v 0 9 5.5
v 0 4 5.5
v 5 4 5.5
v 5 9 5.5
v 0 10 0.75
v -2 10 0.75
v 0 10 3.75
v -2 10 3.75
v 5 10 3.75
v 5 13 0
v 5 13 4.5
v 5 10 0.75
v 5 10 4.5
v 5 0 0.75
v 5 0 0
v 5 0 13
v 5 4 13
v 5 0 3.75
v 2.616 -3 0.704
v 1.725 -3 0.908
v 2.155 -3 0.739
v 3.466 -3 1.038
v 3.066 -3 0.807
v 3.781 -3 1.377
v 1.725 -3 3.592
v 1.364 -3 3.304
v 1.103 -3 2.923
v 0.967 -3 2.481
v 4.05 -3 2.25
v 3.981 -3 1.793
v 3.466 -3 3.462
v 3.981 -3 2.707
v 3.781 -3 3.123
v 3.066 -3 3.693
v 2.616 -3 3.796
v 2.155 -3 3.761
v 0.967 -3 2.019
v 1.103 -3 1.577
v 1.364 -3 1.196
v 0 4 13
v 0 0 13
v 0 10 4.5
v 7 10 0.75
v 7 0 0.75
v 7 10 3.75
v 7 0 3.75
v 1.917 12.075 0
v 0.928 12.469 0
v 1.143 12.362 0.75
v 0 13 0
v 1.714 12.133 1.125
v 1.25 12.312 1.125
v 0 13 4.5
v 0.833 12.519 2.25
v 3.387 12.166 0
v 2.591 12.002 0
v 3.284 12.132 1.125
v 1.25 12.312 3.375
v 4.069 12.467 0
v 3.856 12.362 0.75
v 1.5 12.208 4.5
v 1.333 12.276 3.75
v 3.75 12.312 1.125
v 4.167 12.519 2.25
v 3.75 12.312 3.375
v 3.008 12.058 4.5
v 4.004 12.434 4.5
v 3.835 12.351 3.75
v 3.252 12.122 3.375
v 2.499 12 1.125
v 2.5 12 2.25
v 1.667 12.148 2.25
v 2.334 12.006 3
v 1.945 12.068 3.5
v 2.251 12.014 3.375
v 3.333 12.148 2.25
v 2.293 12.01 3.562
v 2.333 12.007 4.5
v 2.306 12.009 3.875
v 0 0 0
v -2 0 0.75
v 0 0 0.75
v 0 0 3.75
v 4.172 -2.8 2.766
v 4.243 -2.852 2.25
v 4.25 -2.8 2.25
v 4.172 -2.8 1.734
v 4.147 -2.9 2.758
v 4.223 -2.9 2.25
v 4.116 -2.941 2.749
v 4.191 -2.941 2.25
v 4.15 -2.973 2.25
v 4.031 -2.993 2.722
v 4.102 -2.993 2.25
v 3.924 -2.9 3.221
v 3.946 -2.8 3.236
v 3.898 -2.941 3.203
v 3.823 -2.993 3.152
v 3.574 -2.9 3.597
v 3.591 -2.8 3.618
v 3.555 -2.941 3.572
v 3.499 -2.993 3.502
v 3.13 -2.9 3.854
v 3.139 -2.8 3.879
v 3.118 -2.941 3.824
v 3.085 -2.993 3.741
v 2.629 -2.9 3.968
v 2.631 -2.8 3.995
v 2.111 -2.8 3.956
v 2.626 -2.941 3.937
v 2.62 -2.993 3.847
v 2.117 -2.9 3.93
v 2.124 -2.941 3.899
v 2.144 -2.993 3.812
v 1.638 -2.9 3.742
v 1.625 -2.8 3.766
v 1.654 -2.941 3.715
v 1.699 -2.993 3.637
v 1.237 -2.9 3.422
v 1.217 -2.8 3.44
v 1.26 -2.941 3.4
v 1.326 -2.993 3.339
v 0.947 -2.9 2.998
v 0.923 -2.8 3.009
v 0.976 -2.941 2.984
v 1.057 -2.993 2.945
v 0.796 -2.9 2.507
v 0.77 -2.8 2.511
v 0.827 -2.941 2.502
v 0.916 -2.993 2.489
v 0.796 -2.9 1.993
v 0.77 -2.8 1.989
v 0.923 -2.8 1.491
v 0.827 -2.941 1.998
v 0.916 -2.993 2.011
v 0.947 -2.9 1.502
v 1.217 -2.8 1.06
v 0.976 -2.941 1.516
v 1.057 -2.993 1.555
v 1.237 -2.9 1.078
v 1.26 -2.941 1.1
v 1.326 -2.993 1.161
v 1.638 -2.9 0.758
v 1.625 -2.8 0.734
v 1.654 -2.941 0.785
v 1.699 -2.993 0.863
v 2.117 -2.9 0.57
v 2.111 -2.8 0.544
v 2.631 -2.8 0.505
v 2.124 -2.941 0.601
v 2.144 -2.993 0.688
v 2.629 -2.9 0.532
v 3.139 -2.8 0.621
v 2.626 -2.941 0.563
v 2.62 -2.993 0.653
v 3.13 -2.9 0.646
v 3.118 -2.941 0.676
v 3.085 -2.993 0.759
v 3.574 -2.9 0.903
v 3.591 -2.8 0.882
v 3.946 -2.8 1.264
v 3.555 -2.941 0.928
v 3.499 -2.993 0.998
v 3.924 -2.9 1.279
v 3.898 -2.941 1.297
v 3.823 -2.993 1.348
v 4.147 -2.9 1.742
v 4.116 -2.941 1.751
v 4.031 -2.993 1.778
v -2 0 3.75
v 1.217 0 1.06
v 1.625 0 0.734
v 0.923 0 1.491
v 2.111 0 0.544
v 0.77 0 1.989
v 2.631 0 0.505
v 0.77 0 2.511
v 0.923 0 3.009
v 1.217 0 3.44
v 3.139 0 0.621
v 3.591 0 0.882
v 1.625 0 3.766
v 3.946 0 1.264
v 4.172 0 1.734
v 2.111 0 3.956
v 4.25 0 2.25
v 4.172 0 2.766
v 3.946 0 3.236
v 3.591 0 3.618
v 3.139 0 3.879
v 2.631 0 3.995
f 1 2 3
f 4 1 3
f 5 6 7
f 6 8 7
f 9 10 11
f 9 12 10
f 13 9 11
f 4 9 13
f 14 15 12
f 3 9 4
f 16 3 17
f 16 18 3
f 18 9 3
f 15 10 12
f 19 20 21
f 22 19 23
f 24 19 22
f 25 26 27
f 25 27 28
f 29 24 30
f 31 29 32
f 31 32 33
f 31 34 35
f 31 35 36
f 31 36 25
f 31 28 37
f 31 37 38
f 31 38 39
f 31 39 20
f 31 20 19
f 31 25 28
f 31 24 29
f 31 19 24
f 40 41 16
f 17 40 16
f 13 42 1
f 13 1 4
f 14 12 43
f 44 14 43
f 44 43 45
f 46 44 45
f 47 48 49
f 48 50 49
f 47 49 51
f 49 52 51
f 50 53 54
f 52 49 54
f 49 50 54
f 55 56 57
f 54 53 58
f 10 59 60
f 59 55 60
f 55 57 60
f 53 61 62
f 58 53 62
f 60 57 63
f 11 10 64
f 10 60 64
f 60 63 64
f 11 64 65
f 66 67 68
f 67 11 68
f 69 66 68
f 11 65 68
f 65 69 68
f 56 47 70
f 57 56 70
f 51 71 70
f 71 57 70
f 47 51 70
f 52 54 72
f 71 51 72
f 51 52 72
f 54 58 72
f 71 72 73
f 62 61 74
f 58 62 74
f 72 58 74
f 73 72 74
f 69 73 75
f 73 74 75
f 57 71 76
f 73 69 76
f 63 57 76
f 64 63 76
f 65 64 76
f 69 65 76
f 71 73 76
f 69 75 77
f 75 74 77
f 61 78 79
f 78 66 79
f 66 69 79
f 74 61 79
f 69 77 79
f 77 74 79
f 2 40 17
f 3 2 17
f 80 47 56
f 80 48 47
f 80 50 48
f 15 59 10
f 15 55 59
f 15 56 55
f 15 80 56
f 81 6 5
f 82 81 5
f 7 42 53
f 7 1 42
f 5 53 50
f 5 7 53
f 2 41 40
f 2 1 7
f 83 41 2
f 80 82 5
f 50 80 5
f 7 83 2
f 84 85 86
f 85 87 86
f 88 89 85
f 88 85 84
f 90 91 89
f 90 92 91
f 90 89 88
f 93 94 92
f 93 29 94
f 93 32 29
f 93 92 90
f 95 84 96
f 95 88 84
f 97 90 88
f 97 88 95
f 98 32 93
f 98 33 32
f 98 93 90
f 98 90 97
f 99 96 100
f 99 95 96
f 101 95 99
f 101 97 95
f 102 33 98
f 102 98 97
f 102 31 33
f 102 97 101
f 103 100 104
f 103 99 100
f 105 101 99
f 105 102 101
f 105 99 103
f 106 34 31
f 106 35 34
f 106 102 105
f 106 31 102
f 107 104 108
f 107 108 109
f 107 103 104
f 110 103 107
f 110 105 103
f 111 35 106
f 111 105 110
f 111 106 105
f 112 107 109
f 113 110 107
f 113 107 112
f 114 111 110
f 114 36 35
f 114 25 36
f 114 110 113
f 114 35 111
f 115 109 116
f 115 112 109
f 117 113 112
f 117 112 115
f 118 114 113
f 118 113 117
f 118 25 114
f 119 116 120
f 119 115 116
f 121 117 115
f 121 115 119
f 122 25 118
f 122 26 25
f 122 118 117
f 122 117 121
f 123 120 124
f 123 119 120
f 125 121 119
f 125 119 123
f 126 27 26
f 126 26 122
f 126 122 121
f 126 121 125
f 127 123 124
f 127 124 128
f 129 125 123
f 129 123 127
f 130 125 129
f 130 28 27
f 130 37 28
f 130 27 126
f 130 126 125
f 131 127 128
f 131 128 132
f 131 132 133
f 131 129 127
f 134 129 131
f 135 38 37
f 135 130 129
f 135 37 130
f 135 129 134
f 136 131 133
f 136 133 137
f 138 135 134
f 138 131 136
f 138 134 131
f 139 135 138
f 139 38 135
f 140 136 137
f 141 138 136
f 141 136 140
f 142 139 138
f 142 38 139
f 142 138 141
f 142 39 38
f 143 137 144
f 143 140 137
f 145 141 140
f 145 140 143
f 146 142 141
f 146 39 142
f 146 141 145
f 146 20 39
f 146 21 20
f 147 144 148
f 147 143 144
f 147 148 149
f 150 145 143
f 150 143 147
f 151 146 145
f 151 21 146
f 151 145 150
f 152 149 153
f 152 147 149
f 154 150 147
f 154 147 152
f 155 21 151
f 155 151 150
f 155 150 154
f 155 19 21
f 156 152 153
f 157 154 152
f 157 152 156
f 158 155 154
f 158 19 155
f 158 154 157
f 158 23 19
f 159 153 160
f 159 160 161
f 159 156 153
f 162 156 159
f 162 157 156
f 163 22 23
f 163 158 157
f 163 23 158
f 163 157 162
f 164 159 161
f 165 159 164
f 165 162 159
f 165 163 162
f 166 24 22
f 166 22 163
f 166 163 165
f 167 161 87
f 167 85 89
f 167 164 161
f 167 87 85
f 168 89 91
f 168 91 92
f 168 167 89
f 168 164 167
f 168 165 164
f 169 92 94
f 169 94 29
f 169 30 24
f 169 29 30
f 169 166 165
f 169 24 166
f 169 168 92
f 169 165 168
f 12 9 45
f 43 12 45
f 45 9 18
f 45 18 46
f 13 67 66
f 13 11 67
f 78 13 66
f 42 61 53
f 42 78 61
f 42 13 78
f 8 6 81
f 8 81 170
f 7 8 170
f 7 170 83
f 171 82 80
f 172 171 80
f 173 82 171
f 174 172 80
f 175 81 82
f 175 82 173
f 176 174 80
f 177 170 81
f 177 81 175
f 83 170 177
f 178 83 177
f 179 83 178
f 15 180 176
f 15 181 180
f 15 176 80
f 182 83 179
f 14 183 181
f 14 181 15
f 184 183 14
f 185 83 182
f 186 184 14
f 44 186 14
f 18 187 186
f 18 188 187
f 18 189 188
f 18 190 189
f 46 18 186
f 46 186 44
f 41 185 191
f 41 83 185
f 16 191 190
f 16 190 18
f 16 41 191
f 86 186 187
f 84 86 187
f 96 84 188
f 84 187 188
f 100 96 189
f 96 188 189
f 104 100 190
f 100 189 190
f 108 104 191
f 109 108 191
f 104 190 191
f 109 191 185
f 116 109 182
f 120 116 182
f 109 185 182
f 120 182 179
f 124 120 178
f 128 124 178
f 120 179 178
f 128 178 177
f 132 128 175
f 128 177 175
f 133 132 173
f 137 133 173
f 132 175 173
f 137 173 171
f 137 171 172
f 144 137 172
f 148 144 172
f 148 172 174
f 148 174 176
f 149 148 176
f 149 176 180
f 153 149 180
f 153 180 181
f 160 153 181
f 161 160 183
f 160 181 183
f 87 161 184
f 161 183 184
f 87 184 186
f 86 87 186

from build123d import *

# Parameters (mm, degrees)
F0_W     = 5
F0_H     = 7.5
F0_R     = 1.75
F0_H_2   = 1
F1_DEPTH = 4
F2_DEPTH = 3
F0_W_2   = 2
F0_H_3   = 3
F3_DEPTH = 10
F4_DEPTH = 13
F5_SIZE  = 0.99999
F7_DEPTH = 4.501
F8_R     = 0.2


# Not quite as in the source:
# - a fillet or chamfer is up to 0.001 mm smaller than in the source, because OpenCascade refuses the exact size


with BuildPart() as f1:
    # F0 (on Front) → F1 (new body)
    with BuildSketch(Plane.XZ):
        with Locations((2.5, 9.25)):
            Rectangle(F0_W, F0_H)
        Polygon((0, 0.75), (0, 0), (5, 0), (5, 0.75), (5, 3.75), (5, 4.5), (0, 4.5), (0, 3.75), align=None)
        with Locations((2.5, 2.25)):
            Circle(F0_R, mode=Mode.SUBTRACT)
        with Locations((2.5, 2.25)):
            Circle(F0_R)
        with Locations((2.5, 5)):
            Rectangle(F0_W, F0_H_2)
    extrude(amount=-F1_DEPTH)

    # F0 (on Front) → F2 (join)
    with BuildSketch(Plane.XZ):
        with Locations((2.5, 2.25)):
            Circle(F0_R)
    extrude(amount=F2_DEPTH)

    # F0 (on Front) → F3 (join)
    with BuildSketch(Plane.XZ):
        with Locations((6, 2.25)):
            Rectangle(F0_W_2, F0_H_3)
        with Locations((-1, 2.25)):
            Rectangle(F0_W_2, F0_H_3)
        with Locations((2.5, 5)):
            Rectangle(F0_W, F0_H_2)
        Polygon((0, 0.75), (0, 0), (5, 0), (5, 0.75), (5, 3.75), (5, 4.5), (0, 4.5), (0, 3.75), align=None)
        with Locations((2.5, 2.25)):
            Circle(F0_R, mode=Mode.SUBTRACT)
        with Locations((2.5, 2.25)):
            Circle(F0_R)
    extrude(amount=-F3_DEPTH)

    # F0 (on Front) → F4 (join)
    with BuildSketch(Plane.XZ):
        Polygon((0, 0.75), (0, 0), (5, 0), (5, 0.75), (5, 3.75), (5, 4.5), (0, 4.5), (0, 3.75), align=None)
        with Locations((2.5, 2.25)):
            Circle(F0_R, mode=Mode.SUBTRACT)
        with Locations((2.5, 2.25)):
            Circle(F0_R)
    extrude(amount=-F4_DEPTH)

    # F5 (size 1 in the source; OpenCascade refuses exactly that, so slightly less here)
    f5_edges = [f1.edges().sort_by_distance(p)[0] for p in [
        (2.5, 10, 5.5),
    ]]
    chamfer(f5_edges, length=F5_SIZE)

    # F6 (on face) → F7 (cut, through all)
    with BuildSketch(Plane.XY.offset(4.5)):
        with BuildLine():
            Line((5, 13), (2.5, 13))
            Line((2.5, 13), (2.5, 12))
            add(Edge.make_bspline(
                [(5, 13), (4.1666666667, 12.5), (3.3333333333, 12), (2.5, 12)],
                knots=[0, 0, 0, 0, 0.5, 0.5, 0.5, 0.5], degree=3))
        make_face()
        with BuildLine():
            Line((2.5, 12), (2.5, 13))
            Line((2.5, 13), (0, 13))
            add(Edge.make_bspline(
                [(2.5, 12), (1.6666666667, 12), (0.8333333333, 12.5), (0, 13)],
                knots=[0.5, 0.5, 0.5, 0.5, 1, 1, 1, 1], degree=3))
        make_face()
    extrude(amount=-F7_DEPTH, mode=Mode.SUBTRACT)

    # F8
    f8_edges = [f1.edges().sort_by_distance(p)[0] for p in [
        (0.75, -3, 2.25),
    ]]
    fillet(f8_edges, radius=F8_R)


solid = f1.part
